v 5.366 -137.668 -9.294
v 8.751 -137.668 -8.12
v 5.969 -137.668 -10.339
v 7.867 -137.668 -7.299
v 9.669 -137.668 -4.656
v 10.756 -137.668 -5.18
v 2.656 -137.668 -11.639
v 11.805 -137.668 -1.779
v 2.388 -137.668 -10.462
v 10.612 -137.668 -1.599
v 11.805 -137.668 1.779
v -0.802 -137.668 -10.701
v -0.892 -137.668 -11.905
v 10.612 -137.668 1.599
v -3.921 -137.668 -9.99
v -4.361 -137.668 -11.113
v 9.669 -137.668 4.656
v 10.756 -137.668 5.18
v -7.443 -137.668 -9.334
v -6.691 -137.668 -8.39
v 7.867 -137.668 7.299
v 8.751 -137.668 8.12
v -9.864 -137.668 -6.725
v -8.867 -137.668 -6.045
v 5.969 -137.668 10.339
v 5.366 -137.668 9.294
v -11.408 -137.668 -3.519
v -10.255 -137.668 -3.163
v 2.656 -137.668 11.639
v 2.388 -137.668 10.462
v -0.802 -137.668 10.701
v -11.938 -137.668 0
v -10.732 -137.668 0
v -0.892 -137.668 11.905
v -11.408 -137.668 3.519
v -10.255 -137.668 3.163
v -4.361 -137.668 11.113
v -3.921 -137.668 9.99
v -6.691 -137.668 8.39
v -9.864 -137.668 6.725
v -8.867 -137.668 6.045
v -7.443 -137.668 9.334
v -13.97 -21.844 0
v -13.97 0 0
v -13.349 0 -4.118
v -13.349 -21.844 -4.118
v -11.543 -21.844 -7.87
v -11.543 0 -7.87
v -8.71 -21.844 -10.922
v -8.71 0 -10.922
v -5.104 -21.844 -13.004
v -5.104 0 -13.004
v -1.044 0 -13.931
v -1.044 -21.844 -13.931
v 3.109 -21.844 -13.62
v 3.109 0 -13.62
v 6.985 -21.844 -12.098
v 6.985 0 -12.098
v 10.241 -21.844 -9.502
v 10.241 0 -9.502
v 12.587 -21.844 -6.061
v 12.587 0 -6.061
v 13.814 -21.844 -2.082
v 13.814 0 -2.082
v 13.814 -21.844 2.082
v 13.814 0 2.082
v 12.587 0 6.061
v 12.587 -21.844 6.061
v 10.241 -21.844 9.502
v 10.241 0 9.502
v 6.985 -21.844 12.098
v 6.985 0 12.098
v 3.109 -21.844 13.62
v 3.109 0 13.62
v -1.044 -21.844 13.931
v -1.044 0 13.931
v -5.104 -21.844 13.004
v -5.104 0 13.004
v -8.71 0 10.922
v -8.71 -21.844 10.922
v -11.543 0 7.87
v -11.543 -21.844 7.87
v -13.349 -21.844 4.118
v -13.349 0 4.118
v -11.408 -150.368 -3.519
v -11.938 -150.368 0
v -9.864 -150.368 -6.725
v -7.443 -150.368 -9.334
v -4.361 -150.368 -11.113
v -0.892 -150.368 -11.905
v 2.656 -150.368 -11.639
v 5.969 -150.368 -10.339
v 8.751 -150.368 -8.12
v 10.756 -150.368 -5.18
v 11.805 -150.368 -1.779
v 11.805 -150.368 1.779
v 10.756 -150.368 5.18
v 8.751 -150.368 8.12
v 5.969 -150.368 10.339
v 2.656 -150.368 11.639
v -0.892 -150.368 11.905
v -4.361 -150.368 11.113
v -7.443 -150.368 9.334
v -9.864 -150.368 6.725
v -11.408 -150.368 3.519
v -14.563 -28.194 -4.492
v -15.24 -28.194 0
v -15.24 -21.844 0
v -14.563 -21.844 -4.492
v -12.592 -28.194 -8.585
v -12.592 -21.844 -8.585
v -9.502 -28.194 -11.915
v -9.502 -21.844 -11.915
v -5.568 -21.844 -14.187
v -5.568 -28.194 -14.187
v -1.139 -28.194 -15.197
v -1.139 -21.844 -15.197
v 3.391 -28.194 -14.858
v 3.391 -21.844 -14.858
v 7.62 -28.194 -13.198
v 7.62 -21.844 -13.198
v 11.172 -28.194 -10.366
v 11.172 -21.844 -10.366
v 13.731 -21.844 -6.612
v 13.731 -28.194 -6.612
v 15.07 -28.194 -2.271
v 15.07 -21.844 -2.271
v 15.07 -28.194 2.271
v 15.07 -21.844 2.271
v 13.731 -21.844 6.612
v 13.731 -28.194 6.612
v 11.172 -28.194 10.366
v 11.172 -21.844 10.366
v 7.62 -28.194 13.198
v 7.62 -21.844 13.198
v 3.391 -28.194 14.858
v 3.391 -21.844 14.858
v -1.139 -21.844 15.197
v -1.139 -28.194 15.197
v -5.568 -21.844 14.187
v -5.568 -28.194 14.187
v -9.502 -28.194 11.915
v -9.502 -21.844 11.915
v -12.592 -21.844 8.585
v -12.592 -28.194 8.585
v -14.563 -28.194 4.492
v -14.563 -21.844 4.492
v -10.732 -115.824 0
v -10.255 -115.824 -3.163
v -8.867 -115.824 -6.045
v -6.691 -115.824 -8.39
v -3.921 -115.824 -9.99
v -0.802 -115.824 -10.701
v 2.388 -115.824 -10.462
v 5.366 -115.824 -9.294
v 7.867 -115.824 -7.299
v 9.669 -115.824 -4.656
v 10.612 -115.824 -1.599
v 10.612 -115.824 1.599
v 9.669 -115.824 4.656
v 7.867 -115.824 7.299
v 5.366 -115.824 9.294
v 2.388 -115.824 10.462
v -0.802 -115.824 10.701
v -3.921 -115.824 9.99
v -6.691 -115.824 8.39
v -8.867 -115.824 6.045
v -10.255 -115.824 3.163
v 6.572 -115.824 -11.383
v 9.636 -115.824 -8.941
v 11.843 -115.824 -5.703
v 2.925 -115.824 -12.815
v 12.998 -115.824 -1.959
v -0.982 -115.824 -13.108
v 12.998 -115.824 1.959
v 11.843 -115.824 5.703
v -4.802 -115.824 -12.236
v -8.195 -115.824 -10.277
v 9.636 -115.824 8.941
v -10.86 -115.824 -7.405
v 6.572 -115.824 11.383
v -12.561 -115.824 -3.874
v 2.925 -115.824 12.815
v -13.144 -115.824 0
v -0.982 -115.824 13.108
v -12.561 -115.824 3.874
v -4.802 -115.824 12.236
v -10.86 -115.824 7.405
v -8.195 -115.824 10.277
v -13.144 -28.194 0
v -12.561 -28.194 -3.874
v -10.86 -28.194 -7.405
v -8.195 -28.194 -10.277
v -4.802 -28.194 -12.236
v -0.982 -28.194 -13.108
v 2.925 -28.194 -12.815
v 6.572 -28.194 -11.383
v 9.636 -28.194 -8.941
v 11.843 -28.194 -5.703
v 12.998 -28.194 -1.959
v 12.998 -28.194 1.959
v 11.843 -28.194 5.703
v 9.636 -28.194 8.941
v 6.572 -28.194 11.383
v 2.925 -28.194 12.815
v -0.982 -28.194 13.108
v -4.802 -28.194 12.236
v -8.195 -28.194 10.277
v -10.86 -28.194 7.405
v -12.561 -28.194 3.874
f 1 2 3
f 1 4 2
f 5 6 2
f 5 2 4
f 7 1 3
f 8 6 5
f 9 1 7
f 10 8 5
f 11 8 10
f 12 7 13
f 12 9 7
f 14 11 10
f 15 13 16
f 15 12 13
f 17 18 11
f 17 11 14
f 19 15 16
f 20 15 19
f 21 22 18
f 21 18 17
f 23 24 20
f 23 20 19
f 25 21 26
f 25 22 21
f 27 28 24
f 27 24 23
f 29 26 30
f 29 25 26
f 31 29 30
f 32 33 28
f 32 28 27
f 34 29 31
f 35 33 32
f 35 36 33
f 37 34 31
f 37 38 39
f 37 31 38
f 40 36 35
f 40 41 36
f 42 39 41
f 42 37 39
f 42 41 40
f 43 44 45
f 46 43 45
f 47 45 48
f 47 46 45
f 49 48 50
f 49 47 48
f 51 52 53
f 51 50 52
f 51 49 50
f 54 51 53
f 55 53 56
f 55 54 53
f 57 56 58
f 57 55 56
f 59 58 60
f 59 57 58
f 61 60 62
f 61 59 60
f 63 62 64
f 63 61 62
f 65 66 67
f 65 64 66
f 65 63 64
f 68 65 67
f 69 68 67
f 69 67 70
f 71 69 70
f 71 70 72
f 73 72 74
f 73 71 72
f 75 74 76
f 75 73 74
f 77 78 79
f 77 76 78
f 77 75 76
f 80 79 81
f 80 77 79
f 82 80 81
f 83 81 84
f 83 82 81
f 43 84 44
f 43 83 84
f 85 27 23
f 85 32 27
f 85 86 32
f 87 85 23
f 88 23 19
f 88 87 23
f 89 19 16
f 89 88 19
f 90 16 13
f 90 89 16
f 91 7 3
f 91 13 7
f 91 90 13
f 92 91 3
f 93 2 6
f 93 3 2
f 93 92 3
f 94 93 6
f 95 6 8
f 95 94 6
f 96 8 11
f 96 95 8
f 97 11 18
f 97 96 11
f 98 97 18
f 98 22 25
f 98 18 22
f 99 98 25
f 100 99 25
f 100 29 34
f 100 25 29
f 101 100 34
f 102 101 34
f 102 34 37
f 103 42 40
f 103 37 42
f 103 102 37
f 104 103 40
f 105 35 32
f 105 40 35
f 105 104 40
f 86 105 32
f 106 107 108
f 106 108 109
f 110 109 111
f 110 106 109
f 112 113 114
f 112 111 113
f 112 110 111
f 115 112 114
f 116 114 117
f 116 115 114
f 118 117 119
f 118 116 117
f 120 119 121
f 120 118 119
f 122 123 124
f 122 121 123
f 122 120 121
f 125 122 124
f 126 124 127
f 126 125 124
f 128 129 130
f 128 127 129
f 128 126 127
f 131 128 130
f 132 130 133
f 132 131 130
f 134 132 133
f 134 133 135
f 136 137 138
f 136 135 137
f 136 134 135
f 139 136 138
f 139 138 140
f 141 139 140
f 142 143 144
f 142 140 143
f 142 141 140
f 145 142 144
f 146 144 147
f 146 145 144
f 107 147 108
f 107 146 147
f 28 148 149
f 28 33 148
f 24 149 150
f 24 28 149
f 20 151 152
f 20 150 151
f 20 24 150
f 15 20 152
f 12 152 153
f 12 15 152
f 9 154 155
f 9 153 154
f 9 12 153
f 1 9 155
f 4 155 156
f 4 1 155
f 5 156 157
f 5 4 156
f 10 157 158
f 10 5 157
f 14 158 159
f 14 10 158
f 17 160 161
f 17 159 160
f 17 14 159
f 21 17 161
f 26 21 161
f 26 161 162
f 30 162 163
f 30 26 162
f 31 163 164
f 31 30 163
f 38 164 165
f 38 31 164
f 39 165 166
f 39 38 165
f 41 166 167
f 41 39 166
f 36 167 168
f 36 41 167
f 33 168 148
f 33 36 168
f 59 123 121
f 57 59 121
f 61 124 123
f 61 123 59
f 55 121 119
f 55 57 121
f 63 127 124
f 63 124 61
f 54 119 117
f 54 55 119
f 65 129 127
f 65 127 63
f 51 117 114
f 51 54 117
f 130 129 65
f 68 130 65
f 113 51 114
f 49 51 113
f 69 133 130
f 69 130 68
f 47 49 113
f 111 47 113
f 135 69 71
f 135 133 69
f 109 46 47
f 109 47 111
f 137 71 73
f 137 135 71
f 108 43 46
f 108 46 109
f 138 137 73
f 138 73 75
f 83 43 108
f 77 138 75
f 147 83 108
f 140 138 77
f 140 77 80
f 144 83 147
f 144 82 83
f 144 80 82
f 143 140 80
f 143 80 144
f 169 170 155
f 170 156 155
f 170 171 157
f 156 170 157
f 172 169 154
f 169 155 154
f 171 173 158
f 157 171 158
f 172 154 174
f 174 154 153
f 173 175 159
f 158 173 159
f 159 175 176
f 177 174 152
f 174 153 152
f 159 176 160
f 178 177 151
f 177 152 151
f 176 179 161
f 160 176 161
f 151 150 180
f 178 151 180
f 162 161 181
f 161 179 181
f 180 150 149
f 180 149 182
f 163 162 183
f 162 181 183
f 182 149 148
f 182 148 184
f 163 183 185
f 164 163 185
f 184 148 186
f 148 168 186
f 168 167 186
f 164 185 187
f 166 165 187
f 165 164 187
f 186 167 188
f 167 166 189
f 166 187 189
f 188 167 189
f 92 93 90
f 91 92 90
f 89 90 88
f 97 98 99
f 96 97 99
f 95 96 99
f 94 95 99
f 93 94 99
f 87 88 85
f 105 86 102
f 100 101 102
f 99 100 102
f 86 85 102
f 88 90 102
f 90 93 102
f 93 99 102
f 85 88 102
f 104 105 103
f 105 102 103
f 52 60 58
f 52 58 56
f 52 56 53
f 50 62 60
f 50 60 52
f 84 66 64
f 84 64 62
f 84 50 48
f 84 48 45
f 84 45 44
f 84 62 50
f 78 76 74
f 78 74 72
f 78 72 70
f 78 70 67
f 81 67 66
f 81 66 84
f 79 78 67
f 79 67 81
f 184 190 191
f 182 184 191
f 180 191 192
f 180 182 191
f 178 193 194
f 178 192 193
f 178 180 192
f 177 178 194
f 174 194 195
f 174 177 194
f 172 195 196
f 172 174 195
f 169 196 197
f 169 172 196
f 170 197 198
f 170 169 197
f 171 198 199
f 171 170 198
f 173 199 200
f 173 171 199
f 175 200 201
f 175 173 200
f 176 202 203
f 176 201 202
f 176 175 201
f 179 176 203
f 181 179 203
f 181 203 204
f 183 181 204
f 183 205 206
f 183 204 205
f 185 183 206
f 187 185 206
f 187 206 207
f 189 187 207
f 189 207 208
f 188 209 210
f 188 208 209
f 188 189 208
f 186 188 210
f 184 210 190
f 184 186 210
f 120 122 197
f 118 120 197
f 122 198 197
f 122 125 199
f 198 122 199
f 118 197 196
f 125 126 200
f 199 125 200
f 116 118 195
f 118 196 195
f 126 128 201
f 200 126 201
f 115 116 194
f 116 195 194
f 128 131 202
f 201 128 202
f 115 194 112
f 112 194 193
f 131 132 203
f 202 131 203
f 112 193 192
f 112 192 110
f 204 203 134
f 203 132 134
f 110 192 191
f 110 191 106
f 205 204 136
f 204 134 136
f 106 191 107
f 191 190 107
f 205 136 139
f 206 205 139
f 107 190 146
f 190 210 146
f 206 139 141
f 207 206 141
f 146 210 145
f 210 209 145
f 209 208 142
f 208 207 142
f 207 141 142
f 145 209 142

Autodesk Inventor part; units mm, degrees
ref_plane "YZ Plane" through (0, 0, 0) normal (1, 0, 0) x (0, 1, 0)
ref_plane "XZ Plane" through (0, 0, 0) normal (0, 1, 0) x (-1, 0, 0)
ref_plane "XY Plane" through (0, 0, 0) normal (0, 0, 1) x (1, 0, 0)
sketch "Sketch1" plane through (0, 0, 0) normal (0, 0, 1) x (1, 0, 0)
  line L0 (0, 0) -> (-13.97, 0)
  line L1 (-13.97, 0) -> (-13.97, -21.844)
  line L2 (-13.97, -21.844) -> (-15.24, -21.844)
  line L3 (-15.24, -21.844) -> (-15.24, -28.194)
  line L4 (-15.24, -28.194) -> (-13.1445, -28.194)
  line L5 (-13.1445, -28.194) -> (-13.1445, -115.824)
  line L6 (-13.1445, -115.824) -> (-10.7315, -115.824)
  line L7 (-10.7315, -115.824) -> (-10.7315, -137.668)
  line L8 (-10.7315, -137.668) -> (-11.938, -137.668)
  line L9 (-11.938, -137.668) -> (-11.938, -150.368)
  line L10 (-11.938, -150.368) -> (0, -150.368)
  line L11 (0, -150.368) -> (0, 0)
  dimension "d0" = 21.844
  dimension "d1" = 13.97
  dimension "d2" = 6.35
  dimension "d3" = 15.24
  dimension "d4" = 13.1445
  dimension "d5" = 87.63
  dimension "d7" = 10.7315
  dimension "d8" = 21.844
  dimension "d9" = 11.938
  dimension "d10" = 12.7
revolve "Revolution1" add sketch "Sketch1" angle 360 about axis through (0, -150.368, 0) along (0, 1, 0)
equation "\"d0\" = endLength"
equation "\"d1\" = endRadius"
equation "\"d2\" = bandLength"
equation "\"d3\" = bandRadius"
equation "\"d4\" = mainBodyRadius"
equation "\"d5\" = mainBodyLength"
equation "\"d7\" = eyepieceEndRadius"
equation "\"d8\" = endLength"
equation "\"d9\" = eyepieceRadius"
equation "\"d10\" = eyepieceLength"
equation "\"endRadius\" = 13.97"
equation "\"bandRadius\" = 15.24"
equation "\"mainBodyRadius\" = 13.1445"
equation "\"eyepieceEndRadius\" = 10.7315"
equation "\"eyepieceRadius\" = 11.938"
equation "\"endLength\" = 21.844"
equation "\"bandLength\" = 6.35"
equation "\"mainBodyLength\" = 87.63"
equation "\"eyepieceEndLength\" = 13.97"
equation "\"eyepieceLength\" = 12.7"
properties part number "celestronFinder"
